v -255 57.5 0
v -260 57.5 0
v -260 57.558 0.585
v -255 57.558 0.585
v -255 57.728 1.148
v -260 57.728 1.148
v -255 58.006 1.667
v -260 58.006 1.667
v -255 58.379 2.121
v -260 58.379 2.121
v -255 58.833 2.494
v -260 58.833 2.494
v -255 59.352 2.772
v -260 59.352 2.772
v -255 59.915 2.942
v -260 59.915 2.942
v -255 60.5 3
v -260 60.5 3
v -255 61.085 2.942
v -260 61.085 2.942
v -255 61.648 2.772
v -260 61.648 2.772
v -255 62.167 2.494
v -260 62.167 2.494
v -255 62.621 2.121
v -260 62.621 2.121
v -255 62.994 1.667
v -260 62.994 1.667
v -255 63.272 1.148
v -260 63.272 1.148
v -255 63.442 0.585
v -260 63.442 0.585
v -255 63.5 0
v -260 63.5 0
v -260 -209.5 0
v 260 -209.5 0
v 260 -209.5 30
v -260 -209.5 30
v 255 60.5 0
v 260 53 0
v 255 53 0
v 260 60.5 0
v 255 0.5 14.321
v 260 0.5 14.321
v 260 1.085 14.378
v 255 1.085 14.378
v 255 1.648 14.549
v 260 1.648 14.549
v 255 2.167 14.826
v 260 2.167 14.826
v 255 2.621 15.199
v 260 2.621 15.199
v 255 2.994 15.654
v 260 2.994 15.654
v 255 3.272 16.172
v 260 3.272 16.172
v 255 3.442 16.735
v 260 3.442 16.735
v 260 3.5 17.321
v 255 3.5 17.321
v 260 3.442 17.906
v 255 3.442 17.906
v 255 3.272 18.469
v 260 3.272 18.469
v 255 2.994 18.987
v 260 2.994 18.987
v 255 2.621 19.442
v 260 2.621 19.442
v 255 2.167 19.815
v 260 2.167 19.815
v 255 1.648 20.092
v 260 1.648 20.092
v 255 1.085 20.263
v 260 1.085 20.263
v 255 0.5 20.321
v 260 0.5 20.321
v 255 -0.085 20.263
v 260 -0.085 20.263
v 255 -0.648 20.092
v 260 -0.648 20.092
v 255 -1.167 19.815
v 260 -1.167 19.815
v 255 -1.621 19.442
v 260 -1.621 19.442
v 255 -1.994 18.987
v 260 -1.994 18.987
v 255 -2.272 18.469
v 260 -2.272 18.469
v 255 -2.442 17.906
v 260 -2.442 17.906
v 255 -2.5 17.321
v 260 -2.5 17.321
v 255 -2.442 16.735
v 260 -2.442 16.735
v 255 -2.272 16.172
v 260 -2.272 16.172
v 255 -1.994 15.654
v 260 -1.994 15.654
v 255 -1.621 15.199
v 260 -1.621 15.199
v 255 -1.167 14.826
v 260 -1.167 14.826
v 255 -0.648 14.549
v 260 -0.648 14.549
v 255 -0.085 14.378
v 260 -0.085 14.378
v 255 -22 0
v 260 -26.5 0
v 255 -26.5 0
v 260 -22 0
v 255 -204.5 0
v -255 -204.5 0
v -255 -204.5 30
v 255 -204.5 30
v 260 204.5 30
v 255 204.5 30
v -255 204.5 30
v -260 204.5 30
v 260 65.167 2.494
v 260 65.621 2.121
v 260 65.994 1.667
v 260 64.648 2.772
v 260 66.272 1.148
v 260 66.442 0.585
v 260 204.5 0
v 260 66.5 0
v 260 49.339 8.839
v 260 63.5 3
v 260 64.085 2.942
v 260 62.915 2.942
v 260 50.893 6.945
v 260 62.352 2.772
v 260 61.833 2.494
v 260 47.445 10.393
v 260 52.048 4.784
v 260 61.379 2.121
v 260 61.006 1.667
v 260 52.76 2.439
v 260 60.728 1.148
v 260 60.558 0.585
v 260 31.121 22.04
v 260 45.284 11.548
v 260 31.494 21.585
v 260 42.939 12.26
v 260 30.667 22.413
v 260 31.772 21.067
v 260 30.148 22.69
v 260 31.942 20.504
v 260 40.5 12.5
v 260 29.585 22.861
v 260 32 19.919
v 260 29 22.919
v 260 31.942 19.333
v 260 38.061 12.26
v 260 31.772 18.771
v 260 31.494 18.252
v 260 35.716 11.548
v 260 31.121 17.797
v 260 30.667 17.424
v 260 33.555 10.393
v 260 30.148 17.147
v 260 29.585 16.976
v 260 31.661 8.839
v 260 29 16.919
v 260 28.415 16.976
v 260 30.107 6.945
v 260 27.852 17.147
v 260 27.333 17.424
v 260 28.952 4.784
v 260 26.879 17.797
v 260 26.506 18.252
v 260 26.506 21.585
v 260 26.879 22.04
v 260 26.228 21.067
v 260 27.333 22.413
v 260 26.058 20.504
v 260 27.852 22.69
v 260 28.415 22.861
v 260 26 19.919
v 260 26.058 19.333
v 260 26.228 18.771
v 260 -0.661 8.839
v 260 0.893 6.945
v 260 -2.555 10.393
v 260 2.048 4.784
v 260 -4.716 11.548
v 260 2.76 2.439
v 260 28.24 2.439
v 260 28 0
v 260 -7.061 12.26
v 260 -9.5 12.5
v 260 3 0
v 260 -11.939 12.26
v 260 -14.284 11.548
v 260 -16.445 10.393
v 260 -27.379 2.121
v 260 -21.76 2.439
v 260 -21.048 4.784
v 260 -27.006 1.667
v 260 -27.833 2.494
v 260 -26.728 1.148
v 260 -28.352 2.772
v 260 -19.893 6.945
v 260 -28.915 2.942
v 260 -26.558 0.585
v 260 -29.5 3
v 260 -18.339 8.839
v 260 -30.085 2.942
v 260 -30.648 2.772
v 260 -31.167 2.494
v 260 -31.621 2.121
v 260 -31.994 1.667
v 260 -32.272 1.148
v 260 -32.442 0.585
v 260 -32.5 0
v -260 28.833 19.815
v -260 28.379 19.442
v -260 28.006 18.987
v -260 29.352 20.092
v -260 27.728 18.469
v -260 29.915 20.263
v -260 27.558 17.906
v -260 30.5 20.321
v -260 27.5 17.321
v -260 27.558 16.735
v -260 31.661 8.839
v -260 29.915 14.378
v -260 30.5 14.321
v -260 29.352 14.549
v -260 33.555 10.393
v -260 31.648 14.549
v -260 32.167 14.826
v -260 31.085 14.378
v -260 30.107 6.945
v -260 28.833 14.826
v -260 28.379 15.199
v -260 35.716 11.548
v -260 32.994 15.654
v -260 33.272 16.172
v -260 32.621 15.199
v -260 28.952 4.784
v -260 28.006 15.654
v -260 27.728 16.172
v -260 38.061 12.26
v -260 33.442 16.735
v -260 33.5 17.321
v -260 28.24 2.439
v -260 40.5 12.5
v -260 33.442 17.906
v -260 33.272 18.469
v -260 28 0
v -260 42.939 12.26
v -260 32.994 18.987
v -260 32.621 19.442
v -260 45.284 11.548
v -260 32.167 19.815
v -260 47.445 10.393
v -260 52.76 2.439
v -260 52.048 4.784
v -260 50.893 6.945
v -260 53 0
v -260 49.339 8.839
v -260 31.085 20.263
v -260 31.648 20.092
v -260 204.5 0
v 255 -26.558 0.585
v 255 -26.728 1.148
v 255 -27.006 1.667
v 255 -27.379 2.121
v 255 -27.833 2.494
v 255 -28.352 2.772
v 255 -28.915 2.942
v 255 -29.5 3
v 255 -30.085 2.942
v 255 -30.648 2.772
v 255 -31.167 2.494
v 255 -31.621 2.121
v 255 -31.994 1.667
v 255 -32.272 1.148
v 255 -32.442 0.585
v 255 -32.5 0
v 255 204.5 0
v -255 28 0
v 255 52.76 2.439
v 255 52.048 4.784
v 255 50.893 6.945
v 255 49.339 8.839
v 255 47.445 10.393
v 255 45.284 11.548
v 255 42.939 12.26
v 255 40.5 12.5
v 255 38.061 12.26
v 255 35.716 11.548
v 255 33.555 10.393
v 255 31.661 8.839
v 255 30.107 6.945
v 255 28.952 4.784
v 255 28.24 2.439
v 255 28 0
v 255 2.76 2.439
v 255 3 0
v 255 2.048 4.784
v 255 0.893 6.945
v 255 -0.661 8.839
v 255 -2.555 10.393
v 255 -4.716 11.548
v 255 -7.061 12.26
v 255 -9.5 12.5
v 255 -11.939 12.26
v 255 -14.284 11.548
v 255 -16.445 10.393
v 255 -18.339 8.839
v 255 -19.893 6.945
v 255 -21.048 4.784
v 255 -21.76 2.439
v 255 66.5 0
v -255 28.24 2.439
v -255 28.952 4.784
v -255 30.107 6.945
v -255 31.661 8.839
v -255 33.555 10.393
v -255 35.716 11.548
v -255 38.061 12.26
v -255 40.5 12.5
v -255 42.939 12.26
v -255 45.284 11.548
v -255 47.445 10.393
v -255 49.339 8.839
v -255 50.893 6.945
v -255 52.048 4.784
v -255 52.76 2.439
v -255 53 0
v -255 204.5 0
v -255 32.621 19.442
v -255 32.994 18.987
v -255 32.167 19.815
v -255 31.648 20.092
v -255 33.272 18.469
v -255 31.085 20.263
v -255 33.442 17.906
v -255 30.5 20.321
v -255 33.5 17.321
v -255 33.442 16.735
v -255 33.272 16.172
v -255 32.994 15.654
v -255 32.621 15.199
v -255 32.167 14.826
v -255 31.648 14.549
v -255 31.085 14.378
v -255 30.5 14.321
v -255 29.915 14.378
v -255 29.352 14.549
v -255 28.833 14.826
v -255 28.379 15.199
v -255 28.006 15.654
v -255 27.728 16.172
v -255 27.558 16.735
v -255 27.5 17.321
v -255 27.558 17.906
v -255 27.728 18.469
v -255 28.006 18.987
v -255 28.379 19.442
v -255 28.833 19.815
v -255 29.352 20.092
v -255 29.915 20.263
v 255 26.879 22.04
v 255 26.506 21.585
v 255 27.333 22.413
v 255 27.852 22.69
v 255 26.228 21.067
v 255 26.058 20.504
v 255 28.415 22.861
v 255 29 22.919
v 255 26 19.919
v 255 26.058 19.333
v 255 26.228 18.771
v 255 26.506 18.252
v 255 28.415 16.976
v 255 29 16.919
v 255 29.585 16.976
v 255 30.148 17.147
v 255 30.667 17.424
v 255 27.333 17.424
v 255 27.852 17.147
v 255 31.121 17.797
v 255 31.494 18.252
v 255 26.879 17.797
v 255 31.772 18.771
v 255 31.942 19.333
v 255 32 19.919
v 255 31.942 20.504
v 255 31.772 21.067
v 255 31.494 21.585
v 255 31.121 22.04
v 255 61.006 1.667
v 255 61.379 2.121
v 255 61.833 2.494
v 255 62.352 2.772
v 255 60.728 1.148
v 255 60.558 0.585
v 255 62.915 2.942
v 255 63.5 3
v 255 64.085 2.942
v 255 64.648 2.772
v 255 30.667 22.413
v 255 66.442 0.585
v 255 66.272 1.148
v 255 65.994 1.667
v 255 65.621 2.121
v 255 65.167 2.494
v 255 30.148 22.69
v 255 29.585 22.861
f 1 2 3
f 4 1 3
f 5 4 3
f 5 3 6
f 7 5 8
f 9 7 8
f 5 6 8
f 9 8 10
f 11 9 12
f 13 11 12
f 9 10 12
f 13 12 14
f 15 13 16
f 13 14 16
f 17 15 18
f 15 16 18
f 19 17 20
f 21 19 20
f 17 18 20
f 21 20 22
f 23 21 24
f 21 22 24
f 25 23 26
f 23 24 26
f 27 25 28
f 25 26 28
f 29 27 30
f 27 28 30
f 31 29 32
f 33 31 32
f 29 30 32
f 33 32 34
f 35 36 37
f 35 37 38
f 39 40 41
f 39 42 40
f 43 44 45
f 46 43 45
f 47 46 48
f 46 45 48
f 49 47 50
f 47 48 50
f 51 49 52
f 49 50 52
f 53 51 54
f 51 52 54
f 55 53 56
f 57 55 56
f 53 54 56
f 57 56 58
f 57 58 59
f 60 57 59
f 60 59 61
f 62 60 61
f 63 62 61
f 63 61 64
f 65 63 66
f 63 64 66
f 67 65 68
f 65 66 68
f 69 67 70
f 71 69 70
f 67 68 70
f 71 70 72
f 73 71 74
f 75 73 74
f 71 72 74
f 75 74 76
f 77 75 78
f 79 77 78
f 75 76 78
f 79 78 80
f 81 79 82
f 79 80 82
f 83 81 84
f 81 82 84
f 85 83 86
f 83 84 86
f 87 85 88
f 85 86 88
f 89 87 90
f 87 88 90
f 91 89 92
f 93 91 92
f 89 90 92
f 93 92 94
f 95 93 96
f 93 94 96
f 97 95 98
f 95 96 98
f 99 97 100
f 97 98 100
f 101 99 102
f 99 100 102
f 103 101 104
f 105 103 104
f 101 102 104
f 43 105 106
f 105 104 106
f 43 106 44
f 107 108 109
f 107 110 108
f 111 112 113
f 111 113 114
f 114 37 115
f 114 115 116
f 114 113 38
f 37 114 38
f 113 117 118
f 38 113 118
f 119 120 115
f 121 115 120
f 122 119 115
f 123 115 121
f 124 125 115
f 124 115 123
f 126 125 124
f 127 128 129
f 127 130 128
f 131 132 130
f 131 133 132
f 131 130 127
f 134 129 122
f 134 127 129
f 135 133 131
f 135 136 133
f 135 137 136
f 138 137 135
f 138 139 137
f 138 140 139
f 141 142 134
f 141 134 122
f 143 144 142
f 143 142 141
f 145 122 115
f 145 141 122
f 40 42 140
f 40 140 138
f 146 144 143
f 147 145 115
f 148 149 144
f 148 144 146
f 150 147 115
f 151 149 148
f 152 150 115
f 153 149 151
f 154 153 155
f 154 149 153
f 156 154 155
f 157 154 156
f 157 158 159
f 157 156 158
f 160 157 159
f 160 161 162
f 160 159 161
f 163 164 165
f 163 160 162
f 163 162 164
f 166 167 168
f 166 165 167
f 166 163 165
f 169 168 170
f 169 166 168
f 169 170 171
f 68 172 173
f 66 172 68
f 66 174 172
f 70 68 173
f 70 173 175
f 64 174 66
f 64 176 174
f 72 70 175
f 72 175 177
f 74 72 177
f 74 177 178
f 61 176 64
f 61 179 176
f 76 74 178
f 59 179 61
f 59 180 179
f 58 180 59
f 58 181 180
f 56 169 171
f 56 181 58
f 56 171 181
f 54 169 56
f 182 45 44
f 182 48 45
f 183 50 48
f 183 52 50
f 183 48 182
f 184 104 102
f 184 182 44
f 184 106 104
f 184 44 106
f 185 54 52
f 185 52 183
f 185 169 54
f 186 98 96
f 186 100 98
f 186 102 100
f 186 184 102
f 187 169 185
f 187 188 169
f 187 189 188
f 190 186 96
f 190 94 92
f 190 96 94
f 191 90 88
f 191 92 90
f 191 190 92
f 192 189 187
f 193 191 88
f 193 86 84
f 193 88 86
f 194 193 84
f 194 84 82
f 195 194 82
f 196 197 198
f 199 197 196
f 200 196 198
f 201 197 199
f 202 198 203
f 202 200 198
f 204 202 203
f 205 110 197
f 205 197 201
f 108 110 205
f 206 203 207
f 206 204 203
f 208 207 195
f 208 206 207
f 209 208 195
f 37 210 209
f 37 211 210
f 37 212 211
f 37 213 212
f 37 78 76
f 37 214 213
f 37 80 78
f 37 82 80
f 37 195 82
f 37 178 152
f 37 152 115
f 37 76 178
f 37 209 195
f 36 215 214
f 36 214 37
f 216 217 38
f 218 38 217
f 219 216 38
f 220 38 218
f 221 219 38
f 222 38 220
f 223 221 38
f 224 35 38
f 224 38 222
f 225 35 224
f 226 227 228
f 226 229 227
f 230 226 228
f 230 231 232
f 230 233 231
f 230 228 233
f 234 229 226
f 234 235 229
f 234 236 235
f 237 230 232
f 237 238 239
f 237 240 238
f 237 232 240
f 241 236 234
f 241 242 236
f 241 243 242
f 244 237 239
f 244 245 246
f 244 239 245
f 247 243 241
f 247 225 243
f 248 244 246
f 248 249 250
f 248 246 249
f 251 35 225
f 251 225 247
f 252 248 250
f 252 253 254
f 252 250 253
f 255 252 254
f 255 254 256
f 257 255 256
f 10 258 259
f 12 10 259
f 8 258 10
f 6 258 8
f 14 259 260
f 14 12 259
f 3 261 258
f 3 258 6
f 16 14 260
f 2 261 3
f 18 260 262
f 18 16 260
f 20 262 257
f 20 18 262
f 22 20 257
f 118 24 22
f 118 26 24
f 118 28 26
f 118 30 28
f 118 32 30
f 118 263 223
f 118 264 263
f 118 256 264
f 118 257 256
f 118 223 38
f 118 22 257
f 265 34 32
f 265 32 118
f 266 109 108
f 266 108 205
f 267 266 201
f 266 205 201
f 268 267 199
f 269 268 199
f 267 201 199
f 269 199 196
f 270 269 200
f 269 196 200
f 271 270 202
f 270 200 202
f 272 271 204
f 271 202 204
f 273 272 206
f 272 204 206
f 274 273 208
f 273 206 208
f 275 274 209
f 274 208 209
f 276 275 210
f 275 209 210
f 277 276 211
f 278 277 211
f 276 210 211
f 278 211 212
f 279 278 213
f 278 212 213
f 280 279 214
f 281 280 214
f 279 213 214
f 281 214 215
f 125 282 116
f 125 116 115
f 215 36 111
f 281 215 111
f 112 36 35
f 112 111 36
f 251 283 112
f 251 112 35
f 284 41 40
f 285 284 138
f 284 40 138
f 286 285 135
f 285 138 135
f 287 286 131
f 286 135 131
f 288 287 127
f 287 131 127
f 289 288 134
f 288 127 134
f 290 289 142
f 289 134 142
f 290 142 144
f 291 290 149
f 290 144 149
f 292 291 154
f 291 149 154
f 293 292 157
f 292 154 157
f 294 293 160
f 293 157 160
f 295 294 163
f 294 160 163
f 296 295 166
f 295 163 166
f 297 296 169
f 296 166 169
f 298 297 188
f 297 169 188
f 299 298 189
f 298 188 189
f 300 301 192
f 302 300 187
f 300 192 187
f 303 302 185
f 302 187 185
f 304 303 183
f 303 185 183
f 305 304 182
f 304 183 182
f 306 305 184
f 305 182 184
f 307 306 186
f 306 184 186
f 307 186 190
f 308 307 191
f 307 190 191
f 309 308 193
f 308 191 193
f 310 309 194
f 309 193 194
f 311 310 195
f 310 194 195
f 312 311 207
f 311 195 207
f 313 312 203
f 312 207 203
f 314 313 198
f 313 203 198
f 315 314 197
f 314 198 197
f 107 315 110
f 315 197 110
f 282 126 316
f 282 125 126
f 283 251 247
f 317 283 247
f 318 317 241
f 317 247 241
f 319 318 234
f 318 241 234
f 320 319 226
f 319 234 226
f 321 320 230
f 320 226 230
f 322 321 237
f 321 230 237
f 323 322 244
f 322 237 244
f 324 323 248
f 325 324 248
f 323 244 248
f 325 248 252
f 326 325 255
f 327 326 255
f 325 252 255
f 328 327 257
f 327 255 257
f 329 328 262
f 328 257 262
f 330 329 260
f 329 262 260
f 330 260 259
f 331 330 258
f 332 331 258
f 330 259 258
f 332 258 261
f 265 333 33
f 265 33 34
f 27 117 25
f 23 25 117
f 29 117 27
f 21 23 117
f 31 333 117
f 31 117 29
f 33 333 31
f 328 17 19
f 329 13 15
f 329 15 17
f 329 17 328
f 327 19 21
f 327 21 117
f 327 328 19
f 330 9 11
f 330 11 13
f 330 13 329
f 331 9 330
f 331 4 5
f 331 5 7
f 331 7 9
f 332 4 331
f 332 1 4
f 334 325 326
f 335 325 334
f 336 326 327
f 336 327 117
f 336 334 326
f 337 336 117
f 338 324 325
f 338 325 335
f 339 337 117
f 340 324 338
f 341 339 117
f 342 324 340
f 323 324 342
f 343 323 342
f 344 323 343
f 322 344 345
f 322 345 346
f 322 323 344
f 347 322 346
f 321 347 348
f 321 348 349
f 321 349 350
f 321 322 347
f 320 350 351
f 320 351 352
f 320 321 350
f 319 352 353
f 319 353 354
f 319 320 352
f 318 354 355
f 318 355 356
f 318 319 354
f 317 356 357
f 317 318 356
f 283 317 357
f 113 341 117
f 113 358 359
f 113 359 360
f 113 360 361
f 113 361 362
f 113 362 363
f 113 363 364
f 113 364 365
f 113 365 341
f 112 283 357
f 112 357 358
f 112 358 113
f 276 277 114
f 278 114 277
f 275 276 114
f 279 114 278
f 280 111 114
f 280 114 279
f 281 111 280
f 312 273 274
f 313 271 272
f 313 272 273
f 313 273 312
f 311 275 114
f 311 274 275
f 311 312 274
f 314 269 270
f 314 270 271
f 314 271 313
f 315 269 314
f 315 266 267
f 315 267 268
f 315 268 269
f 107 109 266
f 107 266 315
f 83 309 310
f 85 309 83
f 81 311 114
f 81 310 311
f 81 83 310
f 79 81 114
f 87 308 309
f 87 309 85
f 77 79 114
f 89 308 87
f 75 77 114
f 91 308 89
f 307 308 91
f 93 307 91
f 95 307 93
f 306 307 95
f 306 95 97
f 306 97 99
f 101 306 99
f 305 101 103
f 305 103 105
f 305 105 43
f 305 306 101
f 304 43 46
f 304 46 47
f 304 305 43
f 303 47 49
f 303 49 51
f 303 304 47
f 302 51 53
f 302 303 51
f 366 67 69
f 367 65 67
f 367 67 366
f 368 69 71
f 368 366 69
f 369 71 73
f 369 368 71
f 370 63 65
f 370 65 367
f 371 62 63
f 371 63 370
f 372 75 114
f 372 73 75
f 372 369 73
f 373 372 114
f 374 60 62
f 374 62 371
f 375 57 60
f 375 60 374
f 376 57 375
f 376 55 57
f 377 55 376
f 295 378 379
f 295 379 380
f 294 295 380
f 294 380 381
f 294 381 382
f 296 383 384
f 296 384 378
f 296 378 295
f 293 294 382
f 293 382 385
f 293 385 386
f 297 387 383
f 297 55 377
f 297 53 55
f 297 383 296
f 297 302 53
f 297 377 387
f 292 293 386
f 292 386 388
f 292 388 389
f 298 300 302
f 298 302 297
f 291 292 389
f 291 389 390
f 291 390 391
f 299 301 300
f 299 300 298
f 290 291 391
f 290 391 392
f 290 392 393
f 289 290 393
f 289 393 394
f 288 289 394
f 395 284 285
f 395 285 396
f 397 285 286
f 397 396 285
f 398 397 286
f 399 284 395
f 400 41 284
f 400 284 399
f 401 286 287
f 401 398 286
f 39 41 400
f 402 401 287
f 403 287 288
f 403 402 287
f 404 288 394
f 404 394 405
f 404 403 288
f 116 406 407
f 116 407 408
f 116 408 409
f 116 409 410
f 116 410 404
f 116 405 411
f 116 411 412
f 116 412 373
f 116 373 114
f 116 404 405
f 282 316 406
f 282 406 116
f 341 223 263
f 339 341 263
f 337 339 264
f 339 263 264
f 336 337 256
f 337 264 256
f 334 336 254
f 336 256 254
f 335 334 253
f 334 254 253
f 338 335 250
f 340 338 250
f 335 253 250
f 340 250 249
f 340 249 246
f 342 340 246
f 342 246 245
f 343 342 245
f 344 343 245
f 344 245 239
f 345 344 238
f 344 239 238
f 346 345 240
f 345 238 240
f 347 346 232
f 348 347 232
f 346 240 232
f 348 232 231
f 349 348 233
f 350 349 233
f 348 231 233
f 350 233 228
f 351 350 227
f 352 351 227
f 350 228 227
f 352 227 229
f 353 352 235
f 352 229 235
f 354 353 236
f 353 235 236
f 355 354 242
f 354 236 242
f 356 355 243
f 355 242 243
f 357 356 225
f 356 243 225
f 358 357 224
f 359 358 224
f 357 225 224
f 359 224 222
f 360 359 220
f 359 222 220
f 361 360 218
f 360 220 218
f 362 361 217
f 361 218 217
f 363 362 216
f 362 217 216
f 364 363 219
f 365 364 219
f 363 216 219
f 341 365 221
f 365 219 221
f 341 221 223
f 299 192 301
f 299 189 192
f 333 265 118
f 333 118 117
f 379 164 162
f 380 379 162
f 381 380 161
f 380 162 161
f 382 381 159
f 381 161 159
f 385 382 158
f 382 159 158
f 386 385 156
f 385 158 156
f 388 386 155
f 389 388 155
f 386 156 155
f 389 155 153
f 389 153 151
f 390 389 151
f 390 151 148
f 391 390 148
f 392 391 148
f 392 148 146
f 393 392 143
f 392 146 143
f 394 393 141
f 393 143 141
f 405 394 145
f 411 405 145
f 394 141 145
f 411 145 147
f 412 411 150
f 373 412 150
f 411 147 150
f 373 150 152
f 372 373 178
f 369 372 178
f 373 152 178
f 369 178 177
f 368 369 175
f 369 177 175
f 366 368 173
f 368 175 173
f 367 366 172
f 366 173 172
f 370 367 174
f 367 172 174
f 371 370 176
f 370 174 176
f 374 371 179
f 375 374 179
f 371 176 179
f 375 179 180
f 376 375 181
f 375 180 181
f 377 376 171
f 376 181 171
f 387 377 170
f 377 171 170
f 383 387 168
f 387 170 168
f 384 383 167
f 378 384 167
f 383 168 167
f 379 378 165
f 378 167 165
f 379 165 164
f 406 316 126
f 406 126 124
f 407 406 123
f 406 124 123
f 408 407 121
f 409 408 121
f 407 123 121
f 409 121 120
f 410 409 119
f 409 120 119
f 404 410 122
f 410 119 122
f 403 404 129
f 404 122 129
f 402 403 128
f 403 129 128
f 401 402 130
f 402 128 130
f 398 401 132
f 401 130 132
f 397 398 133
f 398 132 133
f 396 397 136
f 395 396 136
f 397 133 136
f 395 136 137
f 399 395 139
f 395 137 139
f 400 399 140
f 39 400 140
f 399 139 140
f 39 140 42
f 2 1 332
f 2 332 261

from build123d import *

# Parameters (mm, degrees)
EXTRUDE_1_DEPTH     = 30
CUT_EXTRUDE_1_REACH = 522
SKETCH_2_R          = 12.5
CUT_EXTRUDE_2_REACH = 522
SKETCH_3_R          = 12.5
SKETCH_5_R          = 3
CUT_EXTRUDE_3_DEPTH = 5
SKETCH_6_R          = 3
CUT_EXTRUDE_5_DEPTH = 5
SKETCH_7_R          = 3
CUT_EXTRUDE_6_DEPTH = 5


with BuildPart() as part:
    # 草图1 → Extrude 1 (new body)
    with BuildSketch(Plane.XY):
        Polygon((-255, 204.5), (-255, -204.5), (255, -204.5), (255, 204.5), (260, 204.5), (260, -209.5), (-260, -209.5), (-260, 204.5), align=None)
    extrude(amount=EXTRUDE_1_DEPTH)

    # 草图2 → 切除-拉伸1 (cut, up to next)
    with BuildSketch(Plane.ZY.offset(260), mode=Mode.PRIVATE) as cut_extrude_1_sk1:
        with Locations((0, 40.5)):
            Circle(SKETCH_2_R)
    cut_extrude_1_tool1 = extrude(cut_extrude_1_sk1.sketch, amount=-CUT_EXTRUDE_1_REACH, mode=Mode.PRIVATE) & part.part
    add(cut_extrude_1_tool1.solids().sort_by_distance((-260, 40.5, 0))[0], mode=Mode.SUBTRACT)

    # 草图3 → 切除-拉伸2 (cut, up to next)
    with BuildSketch(Plane(origin=(260, 0, 0), x_dir=(0, 0, -1), z_dir=(1, 0, 0)), mode=Mode.PRIVATE) as cut_extrude_2_sk1:
        with Locations((0, 40.5)):
            Circle(SKETCH_3_R)
    cut_extrude_2_tool1 = extrude(cut_extrude_2_sk1.sketch, amount=-CUT_EXTRUDE_2_REACH, mode=Mode.PRIVATE) & part.part
    add(cut_extrude_2_tool1.solids().sort_by_distance((260, 40.5, 0))[0], mode=Mode.SUBTRACT)
    # 草图3 → 切除-拉伸2 (cut, up to next)
    with BuildSketch(Plane(origin=(260, 0, 0), x_dir=(0, 0, -1), z_dir=(1, 0, 0)), mode=Mode.PRIVATE) as cut_extrude_2_sk2:
        with Locations((0, -9.5)):
            Circle(SKETCH_3_R)
    cut_extrude_2_tool2 = extrude(cut_extrude_2_sk2.sketch, amount=-CUT_EXTRUDE_2_REACH, mode=Mode.PRIVATE) & part.part
    add(cut_extrude_2_tool2.solids().sort_by_distance((260, -9.5, 0))[0], mode=Mode.SUBTRACT)

    # 草图5 → 切除-拉伸3 (cut)
    with BuildSketch(Plane(origin=(260, 0, 0), x_dir=(0, 0, -1), z_dir=(1, 0, 0))):
        with Locations((0, -29.5)):
            Circle(SKETCH_5_R)
        with Locations((-17.320508076, 0.5)):
            Circle(SKETCH_5_R)
    extrude(amount=-CUT_EXTRUDE_3_DEPTH, mode=Mode.SUBTRACT)

    # 草图6 → 切除-拉伸5 (cut)
    with BuildSketch(Plane.ZY.offset(260)):
        with Locations((0, 60.5)):
            Circle(SKETCH_6_R)
        with Locations((17.320508076, 30.5)):
            Circle(SKETCH_6_R)
    extrude(amount=-CUT_EXTRUDE_5_DEPTH, mode=Mode.SUBTRACT)

    # 草图7 → 切除-拉伸6 (cut)
    with BuildSketch(Plane(origin=(260, 0, 0), x_dir=(0, 0, -1), z_dir=(1, 0, 0))):
        with Locations((0, 63.5)):
            Circle(SKETCH_7_R)
        with Locations((-19.918584287, 29)):
            Circle(SKETCH_7_R)
    extrude(amount=-CUT_EXTRUDE_6_DEPTH, mode=Mode.SUBTRACT)


solid = part.part
